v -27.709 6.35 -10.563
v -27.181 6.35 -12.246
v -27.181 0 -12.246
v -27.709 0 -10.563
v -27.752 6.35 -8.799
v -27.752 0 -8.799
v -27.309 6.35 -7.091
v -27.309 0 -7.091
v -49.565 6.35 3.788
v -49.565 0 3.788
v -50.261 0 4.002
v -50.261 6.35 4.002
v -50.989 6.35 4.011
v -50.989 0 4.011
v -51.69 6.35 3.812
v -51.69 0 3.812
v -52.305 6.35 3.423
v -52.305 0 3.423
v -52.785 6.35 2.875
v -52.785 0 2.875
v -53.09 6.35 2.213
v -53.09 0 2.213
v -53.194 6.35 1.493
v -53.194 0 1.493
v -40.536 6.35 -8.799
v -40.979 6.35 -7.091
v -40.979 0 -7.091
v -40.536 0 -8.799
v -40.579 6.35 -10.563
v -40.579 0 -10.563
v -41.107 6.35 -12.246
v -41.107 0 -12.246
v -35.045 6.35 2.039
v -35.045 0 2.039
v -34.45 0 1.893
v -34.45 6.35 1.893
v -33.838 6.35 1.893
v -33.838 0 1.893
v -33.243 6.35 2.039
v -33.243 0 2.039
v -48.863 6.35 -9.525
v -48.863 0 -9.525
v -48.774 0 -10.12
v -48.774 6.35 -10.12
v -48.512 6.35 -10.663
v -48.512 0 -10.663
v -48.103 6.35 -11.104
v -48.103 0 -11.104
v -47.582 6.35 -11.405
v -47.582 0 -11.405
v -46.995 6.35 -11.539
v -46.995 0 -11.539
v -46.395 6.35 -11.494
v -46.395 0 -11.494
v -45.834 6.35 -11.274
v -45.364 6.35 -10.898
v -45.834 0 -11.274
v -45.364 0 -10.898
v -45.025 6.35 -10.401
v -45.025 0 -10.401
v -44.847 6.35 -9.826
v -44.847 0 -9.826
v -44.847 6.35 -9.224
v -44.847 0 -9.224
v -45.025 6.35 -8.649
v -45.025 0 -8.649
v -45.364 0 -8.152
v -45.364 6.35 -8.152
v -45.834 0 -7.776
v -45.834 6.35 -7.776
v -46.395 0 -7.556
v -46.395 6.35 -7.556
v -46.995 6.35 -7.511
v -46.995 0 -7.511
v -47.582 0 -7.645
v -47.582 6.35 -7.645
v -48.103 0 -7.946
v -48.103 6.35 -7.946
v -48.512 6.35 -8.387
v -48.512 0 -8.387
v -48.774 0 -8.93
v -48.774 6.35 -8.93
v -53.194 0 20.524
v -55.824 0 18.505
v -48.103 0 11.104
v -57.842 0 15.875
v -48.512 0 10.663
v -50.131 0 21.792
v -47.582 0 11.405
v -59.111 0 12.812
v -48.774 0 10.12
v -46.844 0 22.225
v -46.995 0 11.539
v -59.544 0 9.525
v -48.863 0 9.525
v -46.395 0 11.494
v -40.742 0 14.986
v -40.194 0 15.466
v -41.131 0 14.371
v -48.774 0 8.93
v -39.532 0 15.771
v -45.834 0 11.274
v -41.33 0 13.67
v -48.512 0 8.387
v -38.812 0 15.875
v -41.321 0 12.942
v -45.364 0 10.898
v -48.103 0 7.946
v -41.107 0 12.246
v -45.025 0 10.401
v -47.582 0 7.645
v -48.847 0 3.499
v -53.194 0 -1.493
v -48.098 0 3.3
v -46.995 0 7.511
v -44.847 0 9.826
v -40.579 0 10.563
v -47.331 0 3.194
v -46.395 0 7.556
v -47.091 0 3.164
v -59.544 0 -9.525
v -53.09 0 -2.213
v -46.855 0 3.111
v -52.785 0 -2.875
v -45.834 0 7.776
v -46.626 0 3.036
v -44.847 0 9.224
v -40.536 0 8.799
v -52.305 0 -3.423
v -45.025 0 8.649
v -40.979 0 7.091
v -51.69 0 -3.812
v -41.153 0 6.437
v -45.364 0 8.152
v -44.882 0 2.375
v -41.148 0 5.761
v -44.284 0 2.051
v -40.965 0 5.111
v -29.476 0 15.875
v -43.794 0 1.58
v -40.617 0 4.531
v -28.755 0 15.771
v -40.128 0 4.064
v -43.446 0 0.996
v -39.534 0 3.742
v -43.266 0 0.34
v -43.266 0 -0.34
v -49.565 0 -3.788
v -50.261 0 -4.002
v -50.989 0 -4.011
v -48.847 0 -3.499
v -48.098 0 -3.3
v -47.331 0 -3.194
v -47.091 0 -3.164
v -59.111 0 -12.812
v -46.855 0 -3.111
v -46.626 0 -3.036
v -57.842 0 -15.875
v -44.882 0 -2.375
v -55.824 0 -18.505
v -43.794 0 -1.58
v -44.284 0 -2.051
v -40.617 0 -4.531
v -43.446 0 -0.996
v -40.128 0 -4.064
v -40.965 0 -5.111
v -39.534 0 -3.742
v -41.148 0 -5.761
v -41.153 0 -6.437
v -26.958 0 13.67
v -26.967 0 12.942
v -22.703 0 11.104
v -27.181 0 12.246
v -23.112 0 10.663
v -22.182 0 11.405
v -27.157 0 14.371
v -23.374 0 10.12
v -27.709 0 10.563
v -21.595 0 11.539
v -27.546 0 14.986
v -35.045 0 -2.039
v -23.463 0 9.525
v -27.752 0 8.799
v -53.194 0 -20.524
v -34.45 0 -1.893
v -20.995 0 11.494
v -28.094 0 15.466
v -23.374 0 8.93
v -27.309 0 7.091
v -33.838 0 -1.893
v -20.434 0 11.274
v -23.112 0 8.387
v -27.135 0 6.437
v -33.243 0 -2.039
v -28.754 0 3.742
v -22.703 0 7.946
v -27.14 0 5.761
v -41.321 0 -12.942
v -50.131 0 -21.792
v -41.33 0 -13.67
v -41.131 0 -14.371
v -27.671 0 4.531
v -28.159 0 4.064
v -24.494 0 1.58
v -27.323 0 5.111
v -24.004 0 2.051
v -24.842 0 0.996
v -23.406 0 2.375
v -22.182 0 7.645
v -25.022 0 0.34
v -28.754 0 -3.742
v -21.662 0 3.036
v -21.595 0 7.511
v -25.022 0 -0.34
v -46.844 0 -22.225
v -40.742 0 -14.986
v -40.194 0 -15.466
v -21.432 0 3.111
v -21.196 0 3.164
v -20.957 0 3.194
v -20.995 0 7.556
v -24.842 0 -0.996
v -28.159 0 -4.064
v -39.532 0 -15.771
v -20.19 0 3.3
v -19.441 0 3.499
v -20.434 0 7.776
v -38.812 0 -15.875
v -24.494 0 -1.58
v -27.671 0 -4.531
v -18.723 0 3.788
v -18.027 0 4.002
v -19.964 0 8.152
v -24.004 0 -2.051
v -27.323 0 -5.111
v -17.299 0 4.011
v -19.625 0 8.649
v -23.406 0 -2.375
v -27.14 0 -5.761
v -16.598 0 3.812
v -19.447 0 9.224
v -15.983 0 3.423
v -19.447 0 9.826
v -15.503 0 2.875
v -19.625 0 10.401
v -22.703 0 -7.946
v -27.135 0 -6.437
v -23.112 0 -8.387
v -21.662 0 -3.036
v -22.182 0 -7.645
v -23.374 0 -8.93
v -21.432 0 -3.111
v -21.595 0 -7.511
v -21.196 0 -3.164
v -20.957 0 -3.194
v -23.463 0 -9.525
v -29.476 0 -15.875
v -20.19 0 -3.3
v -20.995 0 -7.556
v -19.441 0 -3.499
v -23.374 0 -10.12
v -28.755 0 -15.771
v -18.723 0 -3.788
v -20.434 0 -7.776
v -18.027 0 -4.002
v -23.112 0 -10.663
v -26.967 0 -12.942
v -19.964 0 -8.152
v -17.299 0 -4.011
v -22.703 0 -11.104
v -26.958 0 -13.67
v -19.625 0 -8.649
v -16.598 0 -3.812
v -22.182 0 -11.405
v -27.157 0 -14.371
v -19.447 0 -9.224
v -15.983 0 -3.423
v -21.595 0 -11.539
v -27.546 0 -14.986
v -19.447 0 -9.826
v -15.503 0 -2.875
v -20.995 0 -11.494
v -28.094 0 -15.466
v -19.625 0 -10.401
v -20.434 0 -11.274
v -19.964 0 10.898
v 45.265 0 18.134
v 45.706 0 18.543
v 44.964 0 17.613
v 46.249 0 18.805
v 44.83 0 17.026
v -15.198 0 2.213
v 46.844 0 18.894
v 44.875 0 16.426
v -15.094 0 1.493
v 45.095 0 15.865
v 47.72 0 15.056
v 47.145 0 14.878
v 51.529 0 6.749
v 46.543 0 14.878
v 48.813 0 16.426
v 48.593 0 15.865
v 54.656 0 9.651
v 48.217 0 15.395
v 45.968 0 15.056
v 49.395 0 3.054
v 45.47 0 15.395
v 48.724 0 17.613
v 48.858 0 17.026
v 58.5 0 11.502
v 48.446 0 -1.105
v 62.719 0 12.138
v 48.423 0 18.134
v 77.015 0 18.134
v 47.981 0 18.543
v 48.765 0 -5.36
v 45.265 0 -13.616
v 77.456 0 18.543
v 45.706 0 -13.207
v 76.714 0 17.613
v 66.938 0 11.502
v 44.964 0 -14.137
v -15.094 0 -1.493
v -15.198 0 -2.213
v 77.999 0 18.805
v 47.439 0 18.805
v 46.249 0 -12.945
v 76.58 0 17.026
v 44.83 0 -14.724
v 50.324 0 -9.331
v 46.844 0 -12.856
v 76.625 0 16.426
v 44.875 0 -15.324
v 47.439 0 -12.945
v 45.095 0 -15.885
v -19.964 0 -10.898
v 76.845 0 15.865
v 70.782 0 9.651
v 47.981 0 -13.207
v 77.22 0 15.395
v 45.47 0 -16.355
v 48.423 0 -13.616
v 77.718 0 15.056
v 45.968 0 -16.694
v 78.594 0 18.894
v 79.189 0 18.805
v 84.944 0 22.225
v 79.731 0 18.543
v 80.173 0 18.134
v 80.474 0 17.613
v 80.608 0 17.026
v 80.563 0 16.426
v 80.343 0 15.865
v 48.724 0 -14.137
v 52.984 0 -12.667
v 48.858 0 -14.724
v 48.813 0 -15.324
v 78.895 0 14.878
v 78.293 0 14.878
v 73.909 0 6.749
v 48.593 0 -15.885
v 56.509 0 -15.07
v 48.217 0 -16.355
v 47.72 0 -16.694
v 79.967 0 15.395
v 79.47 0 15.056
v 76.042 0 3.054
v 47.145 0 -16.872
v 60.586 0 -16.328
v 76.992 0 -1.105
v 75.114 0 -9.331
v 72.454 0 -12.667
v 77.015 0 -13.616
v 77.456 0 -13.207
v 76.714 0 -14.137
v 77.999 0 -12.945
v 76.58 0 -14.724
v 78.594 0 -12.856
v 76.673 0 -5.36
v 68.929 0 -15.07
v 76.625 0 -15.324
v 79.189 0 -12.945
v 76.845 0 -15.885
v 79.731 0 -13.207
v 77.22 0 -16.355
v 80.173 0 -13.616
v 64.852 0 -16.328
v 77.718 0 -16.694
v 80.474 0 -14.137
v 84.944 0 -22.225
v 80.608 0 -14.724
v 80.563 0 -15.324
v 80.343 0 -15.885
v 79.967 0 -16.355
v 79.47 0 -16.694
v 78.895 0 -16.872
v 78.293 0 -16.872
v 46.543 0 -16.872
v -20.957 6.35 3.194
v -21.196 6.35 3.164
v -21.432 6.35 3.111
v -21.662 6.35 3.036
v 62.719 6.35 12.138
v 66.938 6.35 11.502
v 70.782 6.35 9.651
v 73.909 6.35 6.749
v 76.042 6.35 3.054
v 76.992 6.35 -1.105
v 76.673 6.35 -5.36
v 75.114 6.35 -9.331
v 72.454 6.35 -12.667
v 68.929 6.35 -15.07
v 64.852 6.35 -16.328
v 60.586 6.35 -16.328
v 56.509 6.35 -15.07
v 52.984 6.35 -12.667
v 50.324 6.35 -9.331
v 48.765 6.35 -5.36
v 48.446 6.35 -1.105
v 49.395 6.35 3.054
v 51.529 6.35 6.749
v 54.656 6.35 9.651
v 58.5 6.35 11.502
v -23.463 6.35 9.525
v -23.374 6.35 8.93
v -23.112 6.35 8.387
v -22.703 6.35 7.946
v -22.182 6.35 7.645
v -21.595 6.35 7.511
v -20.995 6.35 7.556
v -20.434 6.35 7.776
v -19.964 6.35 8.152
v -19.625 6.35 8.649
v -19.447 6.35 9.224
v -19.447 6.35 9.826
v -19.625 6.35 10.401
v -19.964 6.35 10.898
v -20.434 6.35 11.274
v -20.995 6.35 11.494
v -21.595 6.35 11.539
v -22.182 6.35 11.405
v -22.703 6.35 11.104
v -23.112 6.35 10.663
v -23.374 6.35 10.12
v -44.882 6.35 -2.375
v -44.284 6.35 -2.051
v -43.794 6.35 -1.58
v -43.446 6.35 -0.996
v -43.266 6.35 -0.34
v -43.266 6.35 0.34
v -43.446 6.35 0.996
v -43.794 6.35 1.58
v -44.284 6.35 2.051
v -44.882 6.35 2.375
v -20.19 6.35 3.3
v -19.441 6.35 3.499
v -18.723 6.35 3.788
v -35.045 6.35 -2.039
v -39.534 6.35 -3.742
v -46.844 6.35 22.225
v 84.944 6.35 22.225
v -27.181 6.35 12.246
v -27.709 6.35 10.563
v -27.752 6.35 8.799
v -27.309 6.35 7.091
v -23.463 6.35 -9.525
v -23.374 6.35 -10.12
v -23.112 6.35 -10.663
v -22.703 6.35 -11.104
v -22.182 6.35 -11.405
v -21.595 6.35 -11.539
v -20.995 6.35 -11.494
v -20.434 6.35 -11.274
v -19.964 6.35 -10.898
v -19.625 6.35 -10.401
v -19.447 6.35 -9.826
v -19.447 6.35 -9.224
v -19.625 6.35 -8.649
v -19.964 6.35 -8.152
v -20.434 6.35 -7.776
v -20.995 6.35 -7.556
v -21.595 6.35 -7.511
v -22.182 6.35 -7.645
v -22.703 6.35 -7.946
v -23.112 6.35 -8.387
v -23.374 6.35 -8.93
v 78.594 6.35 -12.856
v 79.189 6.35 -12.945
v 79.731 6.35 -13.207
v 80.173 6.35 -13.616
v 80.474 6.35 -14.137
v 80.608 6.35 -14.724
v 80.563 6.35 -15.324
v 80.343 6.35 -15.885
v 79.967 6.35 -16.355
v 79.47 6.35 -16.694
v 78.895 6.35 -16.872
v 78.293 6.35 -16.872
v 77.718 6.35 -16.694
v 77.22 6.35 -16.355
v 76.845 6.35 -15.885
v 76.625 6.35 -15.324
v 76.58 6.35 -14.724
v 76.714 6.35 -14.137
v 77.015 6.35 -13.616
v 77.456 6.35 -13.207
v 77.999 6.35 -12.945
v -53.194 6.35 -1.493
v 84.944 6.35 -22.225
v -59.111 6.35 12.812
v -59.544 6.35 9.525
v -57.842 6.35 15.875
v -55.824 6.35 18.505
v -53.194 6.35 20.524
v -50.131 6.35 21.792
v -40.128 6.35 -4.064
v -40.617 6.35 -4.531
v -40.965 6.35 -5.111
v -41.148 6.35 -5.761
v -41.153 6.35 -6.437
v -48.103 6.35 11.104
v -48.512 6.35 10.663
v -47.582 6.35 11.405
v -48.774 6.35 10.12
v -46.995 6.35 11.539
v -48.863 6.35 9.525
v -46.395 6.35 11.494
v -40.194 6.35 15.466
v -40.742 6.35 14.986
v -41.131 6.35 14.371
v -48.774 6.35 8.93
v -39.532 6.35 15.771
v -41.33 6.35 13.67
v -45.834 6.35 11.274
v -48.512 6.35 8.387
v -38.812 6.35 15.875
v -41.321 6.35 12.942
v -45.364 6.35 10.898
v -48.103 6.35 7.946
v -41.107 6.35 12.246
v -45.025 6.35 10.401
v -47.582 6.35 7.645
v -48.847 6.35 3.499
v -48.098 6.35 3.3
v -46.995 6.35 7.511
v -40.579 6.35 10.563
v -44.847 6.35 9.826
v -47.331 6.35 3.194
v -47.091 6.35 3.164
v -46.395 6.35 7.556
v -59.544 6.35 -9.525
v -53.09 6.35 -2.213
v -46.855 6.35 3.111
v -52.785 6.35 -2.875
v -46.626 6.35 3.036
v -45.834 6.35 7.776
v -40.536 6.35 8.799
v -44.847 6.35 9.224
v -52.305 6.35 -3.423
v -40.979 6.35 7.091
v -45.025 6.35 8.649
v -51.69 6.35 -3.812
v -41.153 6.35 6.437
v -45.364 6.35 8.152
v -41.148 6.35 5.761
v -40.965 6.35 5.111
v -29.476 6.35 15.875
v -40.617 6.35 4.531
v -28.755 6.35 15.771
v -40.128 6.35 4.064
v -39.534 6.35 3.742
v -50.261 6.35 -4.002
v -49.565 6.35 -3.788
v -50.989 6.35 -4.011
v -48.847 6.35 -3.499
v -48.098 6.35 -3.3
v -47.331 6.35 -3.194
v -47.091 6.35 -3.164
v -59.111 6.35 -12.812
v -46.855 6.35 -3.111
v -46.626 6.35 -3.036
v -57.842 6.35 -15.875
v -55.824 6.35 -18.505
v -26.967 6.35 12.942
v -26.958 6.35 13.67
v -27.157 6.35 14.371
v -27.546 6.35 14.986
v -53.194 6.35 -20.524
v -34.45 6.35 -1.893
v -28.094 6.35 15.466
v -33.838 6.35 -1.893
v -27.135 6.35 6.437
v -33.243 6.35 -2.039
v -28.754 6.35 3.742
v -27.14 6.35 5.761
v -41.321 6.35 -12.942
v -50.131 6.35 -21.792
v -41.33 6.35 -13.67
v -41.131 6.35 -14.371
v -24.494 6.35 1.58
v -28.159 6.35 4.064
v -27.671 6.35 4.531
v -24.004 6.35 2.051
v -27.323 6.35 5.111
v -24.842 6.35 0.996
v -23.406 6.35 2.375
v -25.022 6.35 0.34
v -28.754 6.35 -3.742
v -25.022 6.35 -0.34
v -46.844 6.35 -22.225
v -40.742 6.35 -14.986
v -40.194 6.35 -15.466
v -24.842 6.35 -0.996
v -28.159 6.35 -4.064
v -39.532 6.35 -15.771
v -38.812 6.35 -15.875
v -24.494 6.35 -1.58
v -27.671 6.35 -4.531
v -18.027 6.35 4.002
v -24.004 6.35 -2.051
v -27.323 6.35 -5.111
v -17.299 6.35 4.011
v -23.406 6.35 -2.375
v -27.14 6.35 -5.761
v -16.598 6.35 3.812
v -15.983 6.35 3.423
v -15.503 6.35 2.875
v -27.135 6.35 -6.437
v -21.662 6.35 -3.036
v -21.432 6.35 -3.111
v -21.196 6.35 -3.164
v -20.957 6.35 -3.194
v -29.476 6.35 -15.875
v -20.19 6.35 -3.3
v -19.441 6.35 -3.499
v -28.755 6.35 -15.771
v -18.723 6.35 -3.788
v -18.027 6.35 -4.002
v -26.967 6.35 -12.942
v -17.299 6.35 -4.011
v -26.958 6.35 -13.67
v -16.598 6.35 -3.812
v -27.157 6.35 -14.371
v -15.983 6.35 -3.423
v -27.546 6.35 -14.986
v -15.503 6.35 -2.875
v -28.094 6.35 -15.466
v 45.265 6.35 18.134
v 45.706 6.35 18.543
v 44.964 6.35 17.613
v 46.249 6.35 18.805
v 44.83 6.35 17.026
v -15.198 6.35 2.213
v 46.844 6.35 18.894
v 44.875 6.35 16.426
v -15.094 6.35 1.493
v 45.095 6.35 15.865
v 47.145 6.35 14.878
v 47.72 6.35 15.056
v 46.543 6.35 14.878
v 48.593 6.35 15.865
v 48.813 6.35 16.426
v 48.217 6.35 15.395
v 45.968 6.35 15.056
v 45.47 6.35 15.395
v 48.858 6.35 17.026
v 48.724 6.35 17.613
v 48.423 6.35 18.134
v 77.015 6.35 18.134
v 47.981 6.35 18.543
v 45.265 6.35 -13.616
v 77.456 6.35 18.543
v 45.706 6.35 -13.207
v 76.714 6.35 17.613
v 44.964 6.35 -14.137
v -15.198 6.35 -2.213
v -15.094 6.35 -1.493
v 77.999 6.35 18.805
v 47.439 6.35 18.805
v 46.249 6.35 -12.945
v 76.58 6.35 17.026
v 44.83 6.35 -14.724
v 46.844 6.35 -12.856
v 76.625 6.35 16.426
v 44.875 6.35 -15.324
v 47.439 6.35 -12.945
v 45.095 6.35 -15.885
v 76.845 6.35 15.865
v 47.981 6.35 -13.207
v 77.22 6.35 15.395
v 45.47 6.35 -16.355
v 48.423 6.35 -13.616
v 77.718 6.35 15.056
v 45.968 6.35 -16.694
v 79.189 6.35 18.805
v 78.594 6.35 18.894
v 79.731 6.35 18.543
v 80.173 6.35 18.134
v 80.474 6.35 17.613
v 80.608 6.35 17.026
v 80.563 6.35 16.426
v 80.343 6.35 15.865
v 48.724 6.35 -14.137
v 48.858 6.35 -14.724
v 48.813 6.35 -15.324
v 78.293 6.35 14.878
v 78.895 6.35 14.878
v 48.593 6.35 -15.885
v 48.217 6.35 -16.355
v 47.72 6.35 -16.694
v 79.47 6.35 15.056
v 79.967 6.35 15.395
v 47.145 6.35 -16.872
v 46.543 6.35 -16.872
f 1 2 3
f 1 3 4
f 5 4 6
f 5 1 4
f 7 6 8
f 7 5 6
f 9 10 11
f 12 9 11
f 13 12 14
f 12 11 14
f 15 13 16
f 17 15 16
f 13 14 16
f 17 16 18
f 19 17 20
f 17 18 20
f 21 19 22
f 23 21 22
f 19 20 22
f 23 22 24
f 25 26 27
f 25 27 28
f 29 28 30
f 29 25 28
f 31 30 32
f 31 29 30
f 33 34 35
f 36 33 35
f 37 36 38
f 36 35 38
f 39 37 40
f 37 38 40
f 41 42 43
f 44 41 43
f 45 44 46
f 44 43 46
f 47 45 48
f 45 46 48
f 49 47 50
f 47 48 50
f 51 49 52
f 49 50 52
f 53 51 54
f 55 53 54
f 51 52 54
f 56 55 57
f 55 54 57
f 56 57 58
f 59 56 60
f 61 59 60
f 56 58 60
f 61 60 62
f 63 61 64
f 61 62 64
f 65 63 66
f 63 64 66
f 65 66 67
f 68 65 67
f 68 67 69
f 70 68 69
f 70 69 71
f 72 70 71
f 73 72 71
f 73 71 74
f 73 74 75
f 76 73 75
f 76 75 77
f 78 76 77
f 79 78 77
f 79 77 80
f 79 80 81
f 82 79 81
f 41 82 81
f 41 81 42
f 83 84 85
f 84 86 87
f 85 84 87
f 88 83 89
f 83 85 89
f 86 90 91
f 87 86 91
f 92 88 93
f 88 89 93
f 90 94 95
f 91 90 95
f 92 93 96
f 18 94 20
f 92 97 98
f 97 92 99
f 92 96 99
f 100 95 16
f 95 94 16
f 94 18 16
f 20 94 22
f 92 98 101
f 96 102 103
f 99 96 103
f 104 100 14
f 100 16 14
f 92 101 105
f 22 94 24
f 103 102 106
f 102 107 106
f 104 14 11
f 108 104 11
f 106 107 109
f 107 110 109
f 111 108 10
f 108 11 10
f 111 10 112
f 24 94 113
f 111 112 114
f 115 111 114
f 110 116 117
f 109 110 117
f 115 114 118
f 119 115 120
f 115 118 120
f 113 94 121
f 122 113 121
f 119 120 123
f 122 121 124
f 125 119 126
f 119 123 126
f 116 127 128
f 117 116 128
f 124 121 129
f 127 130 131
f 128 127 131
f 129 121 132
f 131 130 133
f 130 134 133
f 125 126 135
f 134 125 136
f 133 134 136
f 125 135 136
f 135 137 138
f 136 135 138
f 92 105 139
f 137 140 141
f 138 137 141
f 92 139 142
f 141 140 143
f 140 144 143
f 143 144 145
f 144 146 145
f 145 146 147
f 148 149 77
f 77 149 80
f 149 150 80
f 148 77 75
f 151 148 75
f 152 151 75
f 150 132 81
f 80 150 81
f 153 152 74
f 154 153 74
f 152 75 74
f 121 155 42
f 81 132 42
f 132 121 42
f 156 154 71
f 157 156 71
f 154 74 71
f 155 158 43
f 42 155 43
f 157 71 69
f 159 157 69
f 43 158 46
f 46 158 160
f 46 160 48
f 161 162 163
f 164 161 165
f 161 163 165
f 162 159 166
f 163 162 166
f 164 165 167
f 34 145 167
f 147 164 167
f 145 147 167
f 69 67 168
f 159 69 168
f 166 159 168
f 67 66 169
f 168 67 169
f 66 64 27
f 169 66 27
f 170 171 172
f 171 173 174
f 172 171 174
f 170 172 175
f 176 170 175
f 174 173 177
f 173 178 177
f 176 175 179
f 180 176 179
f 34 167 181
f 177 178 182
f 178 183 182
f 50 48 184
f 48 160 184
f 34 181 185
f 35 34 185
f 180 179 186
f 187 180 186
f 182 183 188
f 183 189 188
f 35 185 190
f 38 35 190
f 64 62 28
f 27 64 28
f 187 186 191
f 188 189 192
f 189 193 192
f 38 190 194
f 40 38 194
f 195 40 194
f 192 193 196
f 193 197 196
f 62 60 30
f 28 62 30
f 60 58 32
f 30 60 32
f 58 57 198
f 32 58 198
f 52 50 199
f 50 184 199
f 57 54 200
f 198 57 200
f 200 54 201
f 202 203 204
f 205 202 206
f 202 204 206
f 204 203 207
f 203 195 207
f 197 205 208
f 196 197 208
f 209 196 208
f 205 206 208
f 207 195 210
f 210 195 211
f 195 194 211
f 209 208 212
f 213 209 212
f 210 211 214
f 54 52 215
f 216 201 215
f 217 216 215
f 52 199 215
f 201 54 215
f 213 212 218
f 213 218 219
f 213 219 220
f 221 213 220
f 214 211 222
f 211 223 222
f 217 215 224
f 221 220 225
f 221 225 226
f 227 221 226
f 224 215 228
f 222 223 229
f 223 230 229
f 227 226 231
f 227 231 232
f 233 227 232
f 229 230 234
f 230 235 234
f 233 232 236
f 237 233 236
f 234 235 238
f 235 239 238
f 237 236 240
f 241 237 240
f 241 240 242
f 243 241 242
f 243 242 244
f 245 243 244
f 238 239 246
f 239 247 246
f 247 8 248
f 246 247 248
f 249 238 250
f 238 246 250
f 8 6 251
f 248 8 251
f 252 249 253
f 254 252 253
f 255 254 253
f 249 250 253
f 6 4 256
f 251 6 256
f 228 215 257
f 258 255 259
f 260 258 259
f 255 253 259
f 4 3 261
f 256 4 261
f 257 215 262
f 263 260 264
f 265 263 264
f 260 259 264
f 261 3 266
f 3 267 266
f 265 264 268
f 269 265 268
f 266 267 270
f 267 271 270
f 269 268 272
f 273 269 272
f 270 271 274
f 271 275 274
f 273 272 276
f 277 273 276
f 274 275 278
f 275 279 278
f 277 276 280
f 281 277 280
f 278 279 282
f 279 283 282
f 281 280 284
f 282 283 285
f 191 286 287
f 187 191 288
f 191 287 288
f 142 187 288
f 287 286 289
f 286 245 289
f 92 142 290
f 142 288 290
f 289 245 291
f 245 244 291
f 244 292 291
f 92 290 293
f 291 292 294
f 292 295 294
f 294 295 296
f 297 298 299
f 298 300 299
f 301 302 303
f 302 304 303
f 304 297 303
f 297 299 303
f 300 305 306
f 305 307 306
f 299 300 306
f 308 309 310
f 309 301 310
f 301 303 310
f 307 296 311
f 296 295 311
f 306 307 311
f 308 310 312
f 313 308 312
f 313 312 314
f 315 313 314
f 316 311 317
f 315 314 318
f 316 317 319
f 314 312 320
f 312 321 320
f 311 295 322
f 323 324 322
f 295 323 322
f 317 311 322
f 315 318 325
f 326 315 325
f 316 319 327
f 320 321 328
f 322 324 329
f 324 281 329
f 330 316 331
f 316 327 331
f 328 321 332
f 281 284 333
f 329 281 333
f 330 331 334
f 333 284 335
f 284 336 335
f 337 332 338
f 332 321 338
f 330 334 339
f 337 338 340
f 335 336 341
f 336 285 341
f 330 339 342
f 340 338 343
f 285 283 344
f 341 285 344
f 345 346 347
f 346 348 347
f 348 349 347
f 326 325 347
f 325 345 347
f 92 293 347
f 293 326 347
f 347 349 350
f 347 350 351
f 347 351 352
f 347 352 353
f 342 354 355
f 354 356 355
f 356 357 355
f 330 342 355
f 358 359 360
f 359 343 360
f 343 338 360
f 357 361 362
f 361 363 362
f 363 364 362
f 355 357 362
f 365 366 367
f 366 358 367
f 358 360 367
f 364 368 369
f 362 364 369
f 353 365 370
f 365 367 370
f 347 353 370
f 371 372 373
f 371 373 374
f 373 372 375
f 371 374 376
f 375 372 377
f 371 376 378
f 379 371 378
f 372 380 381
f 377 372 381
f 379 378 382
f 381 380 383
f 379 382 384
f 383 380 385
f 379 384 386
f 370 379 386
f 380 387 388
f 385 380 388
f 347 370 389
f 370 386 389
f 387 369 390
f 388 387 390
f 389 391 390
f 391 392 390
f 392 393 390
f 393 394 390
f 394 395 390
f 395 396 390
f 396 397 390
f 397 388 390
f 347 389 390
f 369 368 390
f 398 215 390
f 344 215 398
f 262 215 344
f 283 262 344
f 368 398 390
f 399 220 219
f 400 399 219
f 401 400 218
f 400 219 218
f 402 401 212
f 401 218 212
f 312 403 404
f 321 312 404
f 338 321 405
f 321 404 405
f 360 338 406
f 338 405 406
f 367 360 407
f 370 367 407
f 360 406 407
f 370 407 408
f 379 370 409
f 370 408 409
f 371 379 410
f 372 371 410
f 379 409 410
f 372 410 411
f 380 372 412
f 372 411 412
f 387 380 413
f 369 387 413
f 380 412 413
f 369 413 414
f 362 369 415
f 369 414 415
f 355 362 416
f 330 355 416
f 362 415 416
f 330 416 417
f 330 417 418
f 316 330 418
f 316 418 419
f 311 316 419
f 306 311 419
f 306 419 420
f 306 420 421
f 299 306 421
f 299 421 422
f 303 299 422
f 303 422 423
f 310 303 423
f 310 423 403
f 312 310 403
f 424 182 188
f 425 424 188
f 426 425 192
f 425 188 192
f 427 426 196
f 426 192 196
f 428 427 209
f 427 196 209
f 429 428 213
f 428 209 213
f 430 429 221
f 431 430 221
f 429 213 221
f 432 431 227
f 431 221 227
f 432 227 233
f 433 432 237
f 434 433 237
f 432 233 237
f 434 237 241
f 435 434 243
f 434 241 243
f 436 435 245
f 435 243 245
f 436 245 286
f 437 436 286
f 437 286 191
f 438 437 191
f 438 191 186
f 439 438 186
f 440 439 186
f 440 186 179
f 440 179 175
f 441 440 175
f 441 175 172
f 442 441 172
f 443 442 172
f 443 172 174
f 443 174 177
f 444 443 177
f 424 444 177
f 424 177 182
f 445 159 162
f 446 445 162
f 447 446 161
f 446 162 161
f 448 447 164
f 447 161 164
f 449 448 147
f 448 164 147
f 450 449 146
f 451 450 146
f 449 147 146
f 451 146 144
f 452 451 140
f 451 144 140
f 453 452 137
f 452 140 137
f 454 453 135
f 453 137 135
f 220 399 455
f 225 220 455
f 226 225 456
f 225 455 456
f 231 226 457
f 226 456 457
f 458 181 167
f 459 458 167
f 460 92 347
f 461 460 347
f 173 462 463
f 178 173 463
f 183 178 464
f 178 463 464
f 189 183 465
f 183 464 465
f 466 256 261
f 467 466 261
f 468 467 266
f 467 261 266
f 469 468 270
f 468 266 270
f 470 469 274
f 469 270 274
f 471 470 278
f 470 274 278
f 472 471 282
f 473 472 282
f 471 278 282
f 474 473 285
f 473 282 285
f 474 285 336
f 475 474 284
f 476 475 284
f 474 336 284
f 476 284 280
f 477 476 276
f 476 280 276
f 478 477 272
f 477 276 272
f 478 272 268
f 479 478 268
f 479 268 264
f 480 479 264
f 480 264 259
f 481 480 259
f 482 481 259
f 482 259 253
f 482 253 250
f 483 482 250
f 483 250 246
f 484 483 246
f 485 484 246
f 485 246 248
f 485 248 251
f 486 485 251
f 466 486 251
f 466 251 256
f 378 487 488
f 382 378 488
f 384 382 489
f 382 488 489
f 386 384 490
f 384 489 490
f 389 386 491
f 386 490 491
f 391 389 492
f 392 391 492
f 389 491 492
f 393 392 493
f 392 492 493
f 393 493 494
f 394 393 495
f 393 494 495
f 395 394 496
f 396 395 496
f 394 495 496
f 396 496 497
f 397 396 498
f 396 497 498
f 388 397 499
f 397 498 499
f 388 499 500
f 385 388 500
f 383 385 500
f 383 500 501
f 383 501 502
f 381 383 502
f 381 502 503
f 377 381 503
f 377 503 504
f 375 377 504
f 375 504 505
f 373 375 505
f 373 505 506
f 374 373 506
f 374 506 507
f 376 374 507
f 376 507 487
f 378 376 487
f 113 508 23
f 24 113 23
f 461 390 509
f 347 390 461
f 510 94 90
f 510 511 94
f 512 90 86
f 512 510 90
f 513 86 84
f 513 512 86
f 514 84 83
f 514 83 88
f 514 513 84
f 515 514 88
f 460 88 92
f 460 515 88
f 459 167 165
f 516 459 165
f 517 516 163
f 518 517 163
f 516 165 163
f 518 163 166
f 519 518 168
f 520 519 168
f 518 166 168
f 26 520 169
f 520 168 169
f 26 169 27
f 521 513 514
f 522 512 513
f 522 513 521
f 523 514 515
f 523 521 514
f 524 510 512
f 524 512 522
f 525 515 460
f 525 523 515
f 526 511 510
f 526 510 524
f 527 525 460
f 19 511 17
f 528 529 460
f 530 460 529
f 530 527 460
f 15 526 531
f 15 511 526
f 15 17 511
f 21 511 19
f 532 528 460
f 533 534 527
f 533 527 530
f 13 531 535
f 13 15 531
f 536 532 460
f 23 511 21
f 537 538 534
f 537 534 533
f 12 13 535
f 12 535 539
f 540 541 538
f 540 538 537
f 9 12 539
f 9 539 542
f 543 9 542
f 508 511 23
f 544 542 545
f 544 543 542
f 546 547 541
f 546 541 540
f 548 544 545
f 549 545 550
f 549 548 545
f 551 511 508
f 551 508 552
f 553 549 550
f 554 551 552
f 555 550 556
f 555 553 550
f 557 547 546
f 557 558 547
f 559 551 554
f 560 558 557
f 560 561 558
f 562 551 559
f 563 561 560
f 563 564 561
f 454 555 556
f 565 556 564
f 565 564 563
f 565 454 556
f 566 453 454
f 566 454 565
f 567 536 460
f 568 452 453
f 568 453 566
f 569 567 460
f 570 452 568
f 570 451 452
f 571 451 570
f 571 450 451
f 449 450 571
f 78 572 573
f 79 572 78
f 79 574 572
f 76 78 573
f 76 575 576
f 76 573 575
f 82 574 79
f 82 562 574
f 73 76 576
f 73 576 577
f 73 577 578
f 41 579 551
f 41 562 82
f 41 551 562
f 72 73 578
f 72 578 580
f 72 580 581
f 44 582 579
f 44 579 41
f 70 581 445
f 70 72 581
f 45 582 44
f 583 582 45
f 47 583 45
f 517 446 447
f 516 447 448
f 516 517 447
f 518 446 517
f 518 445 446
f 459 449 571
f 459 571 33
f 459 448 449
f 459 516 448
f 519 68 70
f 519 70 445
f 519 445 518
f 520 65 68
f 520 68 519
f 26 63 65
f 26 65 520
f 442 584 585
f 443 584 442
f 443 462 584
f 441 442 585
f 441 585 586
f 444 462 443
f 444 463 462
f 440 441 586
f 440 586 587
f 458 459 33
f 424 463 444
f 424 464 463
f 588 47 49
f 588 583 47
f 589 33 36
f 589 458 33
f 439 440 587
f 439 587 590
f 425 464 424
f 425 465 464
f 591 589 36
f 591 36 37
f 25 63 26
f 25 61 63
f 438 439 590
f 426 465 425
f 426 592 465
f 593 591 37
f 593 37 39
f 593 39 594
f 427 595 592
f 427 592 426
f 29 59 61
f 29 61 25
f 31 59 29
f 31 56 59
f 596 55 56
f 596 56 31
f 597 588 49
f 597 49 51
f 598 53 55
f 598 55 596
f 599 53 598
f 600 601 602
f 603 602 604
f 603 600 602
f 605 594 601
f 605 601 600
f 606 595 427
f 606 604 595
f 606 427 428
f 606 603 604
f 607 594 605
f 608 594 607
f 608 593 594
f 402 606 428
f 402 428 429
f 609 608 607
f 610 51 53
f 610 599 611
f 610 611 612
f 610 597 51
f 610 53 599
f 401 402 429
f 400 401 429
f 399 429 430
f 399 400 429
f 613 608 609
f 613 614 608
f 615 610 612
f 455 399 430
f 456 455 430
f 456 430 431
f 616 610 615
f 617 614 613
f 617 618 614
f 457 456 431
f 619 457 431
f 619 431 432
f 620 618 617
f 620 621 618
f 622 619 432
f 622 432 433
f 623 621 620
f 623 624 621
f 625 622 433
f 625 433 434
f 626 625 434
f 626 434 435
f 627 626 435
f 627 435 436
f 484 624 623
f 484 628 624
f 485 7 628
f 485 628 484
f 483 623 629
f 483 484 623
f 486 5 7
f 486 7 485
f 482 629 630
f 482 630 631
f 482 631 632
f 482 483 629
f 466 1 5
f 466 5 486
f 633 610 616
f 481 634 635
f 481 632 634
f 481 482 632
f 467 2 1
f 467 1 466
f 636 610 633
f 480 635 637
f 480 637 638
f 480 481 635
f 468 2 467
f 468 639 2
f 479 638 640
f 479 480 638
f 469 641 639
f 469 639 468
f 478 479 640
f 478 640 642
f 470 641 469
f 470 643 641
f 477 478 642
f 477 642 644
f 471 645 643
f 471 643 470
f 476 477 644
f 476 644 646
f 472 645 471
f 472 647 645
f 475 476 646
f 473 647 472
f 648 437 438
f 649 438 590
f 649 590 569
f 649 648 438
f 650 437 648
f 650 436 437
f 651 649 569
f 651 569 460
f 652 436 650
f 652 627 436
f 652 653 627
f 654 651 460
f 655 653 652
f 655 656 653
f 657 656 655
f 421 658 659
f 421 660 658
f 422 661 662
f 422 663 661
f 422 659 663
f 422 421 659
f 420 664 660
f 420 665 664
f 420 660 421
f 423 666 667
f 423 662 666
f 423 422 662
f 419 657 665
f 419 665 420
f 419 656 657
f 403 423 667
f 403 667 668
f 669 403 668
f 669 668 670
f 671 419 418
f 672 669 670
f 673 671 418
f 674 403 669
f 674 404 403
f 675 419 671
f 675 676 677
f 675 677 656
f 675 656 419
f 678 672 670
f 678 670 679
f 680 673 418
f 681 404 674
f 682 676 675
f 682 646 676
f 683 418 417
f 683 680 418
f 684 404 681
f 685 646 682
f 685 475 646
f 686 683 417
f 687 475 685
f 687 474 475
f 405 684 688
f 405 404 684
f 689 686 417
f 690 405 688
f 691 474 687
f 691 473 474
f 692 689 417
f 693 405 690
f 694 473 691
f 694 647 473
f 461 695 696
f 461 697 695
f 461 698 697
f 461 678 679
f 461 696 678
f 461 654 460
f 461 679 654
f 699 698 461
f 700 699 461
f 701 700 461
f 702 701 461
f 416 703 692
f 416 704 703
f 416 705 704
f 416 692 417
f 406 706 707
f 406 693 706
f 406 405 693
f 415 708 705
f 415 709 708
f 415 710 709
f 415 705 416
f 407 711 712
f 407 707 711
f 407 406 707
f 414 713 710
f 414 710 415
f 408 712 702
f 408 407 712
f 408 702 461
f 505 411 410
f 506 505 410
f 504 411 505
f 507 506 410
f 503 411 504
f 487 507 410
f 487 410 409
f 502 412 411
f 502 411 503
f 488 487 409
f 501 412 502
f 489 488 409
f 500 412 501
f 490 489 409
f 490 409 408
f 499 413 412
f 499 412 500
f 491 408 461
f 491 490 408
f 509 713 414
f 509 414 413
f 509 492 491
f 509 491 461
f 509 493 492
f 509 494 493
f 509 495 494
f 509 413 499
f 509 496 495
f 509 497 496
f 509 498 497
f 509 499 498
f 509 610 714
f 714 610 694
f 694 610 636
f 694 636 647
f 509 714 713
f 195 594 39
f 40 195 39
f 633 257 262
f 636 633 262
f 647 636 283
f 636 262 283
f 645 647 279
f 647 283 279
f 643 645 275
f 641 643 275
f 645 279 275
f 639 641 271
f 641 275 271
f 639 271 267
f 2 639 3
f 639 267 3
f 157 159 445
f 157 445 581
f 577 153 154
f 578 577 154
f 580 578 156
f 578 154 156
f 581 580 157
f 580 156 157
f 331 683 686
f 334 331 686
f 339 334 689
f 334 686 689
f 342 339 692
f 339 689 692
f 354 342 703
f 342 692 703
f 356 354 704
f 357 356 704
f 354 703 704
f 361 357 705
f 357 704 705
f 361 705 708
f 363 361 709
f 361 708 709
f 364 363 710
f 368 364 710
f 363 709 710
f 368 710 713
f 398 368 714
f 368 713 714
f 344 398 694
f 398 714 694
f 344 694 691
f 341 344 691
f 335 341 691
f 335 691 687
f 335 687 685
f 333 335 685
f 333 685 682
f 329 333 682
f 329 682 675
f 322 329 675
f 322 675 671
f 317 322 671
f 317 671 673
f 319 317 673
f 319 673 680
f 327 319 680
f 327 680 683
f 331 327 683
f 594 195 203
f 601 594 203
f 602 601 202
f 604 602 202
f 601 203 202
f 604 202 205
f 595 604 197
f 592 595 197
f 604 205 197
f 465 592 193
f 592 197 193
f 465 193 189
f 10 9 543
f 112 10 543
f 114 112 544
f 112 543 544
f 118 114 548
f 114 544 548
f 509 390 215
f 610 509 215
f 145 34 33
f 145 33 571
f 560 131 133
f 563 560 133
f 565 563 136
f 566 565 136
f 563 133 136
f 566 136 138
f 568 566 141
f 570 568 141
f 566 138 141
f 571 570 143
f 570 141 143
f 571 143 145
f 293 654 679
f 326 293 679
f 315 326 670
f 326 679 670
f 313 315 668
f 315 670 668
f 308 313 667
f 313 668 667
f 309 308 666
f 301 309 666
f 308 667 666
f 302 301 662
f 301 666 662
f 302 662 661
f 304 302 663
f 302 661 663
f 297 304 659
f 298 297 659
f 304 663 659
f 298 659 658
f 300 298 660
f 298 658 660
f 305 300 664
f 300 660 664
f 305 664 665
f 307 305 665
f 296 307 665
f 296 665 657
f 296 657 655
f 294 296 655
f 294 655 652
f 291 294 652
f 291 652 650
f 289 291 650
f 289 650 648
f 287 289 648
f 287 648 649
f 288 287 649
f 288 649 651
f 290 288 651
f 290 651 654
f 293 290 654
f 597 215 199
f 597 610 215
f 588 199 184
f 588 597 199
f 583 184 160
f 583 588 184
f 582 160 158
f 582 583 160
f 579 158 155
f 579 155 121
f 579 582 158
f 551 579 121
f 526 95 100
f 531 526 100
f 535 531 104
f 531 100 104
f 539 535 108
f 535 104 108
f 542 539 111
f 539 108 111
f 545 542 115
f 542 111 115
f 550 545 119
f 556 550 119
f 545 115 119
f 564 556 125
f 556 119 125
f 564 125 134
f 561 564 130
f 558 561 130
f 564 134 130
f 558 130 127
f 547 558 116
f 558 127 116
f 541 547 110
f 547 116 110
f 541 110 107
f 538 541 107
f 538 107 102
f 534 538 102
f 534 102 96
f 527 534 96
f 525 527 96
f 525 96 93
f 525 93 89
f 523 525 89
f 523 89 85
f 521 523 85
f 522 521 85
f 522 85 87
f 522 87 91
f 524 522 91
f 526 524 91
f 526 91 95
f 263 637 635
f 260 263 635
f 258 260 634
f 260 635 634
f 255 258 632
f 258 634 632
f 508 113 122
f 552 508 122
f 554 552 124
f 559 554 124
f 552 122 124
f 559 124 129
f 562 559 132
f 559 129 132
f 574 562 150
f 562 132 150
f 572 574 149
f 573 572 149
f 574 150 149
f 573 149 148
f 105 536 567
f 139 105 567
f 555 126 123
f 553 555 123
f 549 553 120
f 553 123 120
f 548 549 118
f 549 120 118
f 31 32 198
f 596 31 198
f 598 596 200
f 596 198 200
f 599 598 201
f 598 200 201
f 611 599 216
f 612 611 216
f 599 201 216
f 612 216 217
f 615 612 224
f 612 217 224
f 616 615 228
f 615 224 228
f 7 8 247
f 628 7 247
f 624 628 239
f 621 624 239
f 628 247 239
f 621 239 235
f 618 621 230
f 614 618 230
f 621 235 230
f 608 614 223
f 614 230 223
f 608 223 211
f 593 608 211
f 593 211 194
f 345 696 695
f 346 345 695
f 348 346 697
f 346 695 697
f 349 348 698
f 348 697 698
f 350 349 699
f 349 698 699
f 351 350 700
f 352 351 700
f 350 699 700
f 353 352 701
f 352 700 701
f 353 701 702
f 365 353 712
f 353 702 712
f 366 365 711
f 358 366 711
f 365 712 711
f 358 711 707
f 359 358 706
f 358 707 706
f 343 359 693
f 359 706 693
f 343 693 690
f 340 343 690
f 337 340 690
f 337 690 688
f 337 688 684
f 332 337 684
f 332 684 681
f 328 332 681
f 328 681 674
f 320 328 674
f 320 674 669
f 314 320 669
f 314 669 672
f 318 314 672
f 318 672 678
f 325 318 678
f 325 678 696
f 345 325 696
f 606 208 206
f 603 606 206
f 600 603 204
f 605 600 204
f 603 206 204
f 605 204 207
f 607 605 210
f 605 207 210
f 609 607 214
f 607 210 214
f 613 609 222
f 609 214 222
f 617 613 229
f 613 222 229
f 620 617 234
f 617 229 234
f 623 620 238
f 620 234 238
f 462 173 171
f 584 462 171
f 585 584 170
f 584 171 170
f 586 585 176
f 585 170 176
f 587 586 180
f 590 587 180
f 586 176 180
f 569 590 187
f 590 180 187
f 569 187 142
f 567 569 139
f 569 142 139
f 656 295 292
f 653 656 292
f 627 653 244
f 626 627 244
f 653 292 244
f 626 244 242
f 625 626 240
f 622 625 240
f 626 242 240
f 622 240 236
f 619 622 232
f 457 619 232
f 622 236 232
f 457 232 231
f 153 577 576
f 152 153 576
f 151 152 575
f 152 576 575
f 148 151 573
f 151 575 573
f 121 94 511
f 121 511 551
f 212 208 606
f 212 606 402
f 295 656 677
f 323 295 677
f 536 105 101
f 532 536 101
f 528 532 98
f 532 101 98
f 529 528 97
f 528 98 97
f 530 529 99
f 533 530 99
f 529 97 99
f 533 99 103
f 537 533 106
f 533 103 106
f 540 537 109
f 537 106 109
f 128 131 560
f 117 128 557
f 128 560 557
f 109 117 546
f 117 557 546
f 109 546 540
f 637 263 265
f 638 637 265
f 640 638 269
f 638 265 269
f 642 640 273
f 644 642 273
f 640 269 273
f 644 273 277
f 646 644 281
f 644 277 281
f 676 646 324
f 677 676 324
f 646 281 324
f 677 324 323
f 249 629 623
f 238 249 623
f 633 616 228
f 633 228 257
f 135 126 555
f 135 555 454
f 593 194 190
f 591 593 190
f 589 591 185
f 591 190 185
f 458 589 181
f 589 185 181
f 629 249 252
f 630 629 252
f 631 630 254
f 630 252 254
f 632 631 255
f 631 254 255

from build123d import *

# Parameters (mm, degrees)
BOSS_EXTRUDE1_DEPTH    = 6.35
F_10_32_TAPPED_HOLE2_D = 4.0386
FILLET2_R              = 12.7
CUT_EXTRUDE3_DEPTH     = 89.032651707
FILLET3_DEPTH          = 6.35
SKETCH12_R             = 14.3129
CUT_EXTRUDE4_DEPTH     = 89.032651707
SKETCH13_R             = 2.0193
CUT_EXTRUDE5_DEPTH     = 89.032651707


with BuildPart() as part:
    # Sketch1 → Boss-Extrude1 (new body)
    with BuildSketch(Plane(origin=(0, 0, 0), x_dir=(1, 0, 0), z_dir=(0, 1, 0))):
        Polygon((59.54395, 22.225), (84.94395, 22.225), (84.94395, -22.225), (59.54395, -22.225), (-59.54395, -22.225), (-59.54395, 22.225), align=None)
    extrude(amount=BOSS_EXTRUDE1_DEPTH)

    # #10-32 Tapped Hole2 (through all)
    with Locations(Plane(origin=(0, 6.35, 0), x_dir=(1, 0, 0), z_dir=(0, 1, 0))):
        with Locations((-46.84395, 9.525), (-21.44395, 9.525), (-21.44395, -9.525), (-46.84395, -9.525)):
            Hole(F_10_32_TAPPED_HOLE2_D / 2)

    # Fillet2
    fillet2_edges = [part.edges().sort_by_distance(p)[0] for p in [
        (-59.54395, 3.175, 22.225),
        (-59.54395, 3.175, -22.225),
    ]]
    fillet(fillet2_edges, radius=FILLET2_R)

    # Sketch11 → Cut-Extrude3 (cut, through all)
    with BuildSketch(Plane(origin=(0, 6.35, 0), x_dir=(1, 0, 0), z_dir=(0, 1, 0))):
        with BuildLine():
            Line((-46.84395, 15.875), (-21.44395, 15.875))
            ThreePointArc((-21.44395, 15.875), (-27.353773893, 11.848032834), (-25.767954708, 4.874679228))
            Line((-25.767954708, 4.874679228), (-34.14395, 1.697847323))
            Line((-34.14395, 1.697847323), (-42.519945292, 4.874679228))
            ThreePointArc((-42.519945292, 4.874679228), (-40.934126107, 11.848032834), (-46.84395, 15.875))
        make_face()
        with BuildLine():
            Line((-15.09395, -9.525), (-15.09395, 9.525))
            ThreePointArc((-15.09395, 9.525), (-16.90021853, 5.089123048), (-21.291431679, 3.176831905))
            Line((-21.291431679, 3.176831905), (-29.667426971, 0))
            Line((-29.667426971, 0), (-21.291431679, -3.176831905))
            ThreePointArc((-21.291431679, -3.176831905), (-16.90021853, -5.089123048), (-15.09395, -9.525))
        make_face()
        with BuildLine():
            Line((-53.19395, 9.525), (-53.19395, -9.525))
            ThreePointArc((-53.19395, -9.525), (-51.38768147, -5.089123048), (-46.996468321, -3.176831905))
            Line((-46.996468321, -3.176831905), (-38.620473029, 0))
            Line((-38.620473029, 0), (-46.996468321, 3.176831905))
            ThreePointArc((-46.996468321, 3.176831905), (-51.38768147, 5.089123048), (-53.19395, 9.525))
        make_face()
        with BuildLine():
            Line((-46.84395, -15.875), (-21.44395, -15.875))
            ThreePointArc((-21.44395, -15.875), (-27.353773893, -11.848032834), (-25.767954708, -4.874679228))
            Line((-25.767954708, -4.874679228), (-34.14395, -1.697847323))
            Line((-34.14395, -1.697847323), (-42.519945292, -4.874679228))
            ThreePointArc((-42.519945292, -4.874679228), (-40.934126107, -11.848032834), (-46.84395, -15.875))
        make_face()
    extrude(amount=-CUT_EXTRUDE3_DEPTH, mode=Mode.SUBTRACT)

    # Fillet3: read off the stored shape, not the designer's step
    # Fillet3 outline → Fillet3 (add)
    with BuildSketch(Plane(origin=(0, 0, 0), x_dir=(1, 0, 0), z_dir=(0, 1, 0))):
        with BuildLine():
            ThreePointArc((-18.722521429, 3.787724817), (-16.276262891, 3.63950655), (-15.09395, 1.492814743))
            Line((-15.09395, 1.492814743), (-15.09395, 9.525))
            ThreePointArc((-15.09395, 9.525), (-16.077220482, 6.130782227), (-18.722521429, 3.787724817))
        make_face()
        with BuildLine():
            Line((-15.09395, -9.525), (-15.09395, -1.492814743))
            ThreePointArc((-15.09395, -1.492814743), (-16.276262891, -3.63950655), (-18.722521429, -3.787724817))
            ThreePointArc((-18.722521429, -3.787724817), (-16.077220482, -6.130782227), (-15.09395, -9.525))
        make_face()
        with BuildLine():
            ThreePointArc((-21.662369003, 3.036143487), (-21.315105323, 3.140185377), (-20.956567225, 3.19373172))
            ThreePointArc((-20.956567225, 3.19373172), (-21.12388789, 3.183071252), (-21.291431679, 3.176831905))
            Line((-21.291431679, 3.176831905), (-21.662369003, 3.036143487))
        make_face()
        with BuildLine():
            ThreePointArc((-21.291431679, -3.176831905), (-21.12388789, -3.183071252), (-20.956567225, -3.19373172))
            ThreePointArc((-20.956567225, -3.19373172), (-21.315105323, -3.140185377), (-21.662369003, -3.036143487))
            Line((-21.662369003, -3.036143487), (-21.291431679, -3.176831905))
        make_face()
        with BuildLine():
            ThreePointArc((-23.405745013, -2.374919079), (-25.044990125, 0), (-23.405745013, 2.374919079))
            Line((-23.405745013, 2.374919079), (-29.667426971, 0))
            Line((-29.667426971, 0), (-23.405745013, -2.374919079))
        make_face()
        with BuildLine():
            ThreePointArc((-41.106674817, 12.246428571), (-40.95845655, 14.692687109), (-38.811764743, 15.875))
            Line((-38.811764743, 15.875), (-46.84395, 15.875))
            ThreePointArc((-46.84395, 15.875), (-43.449732228, 14.891729517), (-41.106674817, 12.246428571))
        make_face()
        with BuildLine():
            Line((-21.44395, 15.875), (-29.476135257, 15.875))
            ThreePointArc((-29.476135257, 15.875), (-27.32944345, 14.692687109), (-27.181225183, 12.246428571))
            ThreePointArc((-27.181225183, 12.246428571), (-24.838167772, 14.891729517), (-21.44395, 15.875))
        make_face()
        with BuildLine():
            ThreePointArc((-39.533862913, 3.742123461), (-40.965188005, 5.110562055), (-40.979062875, 7.090744671))
            ThreePointArc((-40.979062875, 7.090744671), (-41.630398839, 5.899895272), (-42.519945292, 4.874679228))
            Line((-42.519945292, 4.874679228), (-39.533862913, 3.742123461))
        make_face()
        with BuildLine():
            ThreePointArc((-25.767954708, 4.874679228), (-26.657501161, 5.899895272), (-27.308837125, 7.090744671))
            ThreePointArc((-27.308837125, 7.090744671), (-27.322711995, 5.110562055), (-28.754037087, 3.742123461))
            Line((-28.754037087, 3.742123461), (-25.767954708, 4.874679228))
        make_face()
        with BuildLine():
            ThreePointArc((-33.243195112, 2.03948396), (-34.14395, 1.874403039), (-35.044704888, 2.03948396))
            Line((-35.044704888, 2.03948396), (-34.14395, 1.697847323))
            Line((-34.14395, 1.697847323), (-33.243195112, 2.03948396))
        make_face()
        with BuildLine():
            Line((-38.620473029, 0), (-44.882154987, 2.374919079))
            ThreePointArc((-44.882154987, 2.374919079), (-43.242909875, 0), (-44.882154987, -2.374919079))
            Line((-44.882154987, -2.374919079), (-38.620473029, 0))
        make_face()
        with BuildLine():
            ThreePointArc((-47.331332775, 3.19373172), (-46.972794677, 3.140185377), (-46.625530997, 3.036143487))
            Line((-46.625530997, 3.036143487), (-46.996468321, 3.176831905))
            ThreePointArc((-46.996468321, 3.176831905), (-47.16401211, 3.183071252), (-47.331332775, 3.19373172))
        make_face()
        with BuildLine():
            Line((-46.996468321, -3.176831905), (-46.625530997, -3.036143487))
            ThreePointArc((-46.625530997, -3.036143487), (-46.972794677, -3.140185377), (-47.331332775, -3.19373172))
            ThreePointArc((-47.331332775, -3.19373172), (-47.16401211, -3.183071252), (-46.996468321, -3.176831905))
        make_face()
        with BuildLine():
            ThreePointArc((-53.19395, 1.492814743), (-52.011637109, 3.63950655), (-49.565378571, 3.787724817))
            ThreePointArc((-49.565378571, 3.787724817), (-52.210679518, 6.130782227), (-53.19395, 9.525))
            Line((-53.19395, 9.525), (-53.19395, 1.492814743))
        make_face()
        with BuildLine():
            ThreePointArc((-53.19395, -9.525), (-52.210679518, -6.130782227), (-49.565378571, -3.787724816))
            ThreePointArc((-49.565378571, -3.787724816), (-52.011637109, -3.63950655), (-53.19395, -1.492814743))
            Line((-53.19395, -1.492814743), (-53.19395, -9.525))
        make_face()
        with BuildLine():
            ThreePointArc((-40.979062875, -7.090744671), (-40.965188005, -5.110562055), (-39.533862913, -3.742123461))
            Line((-39.533862913, -3.742123461), (-42.519945292, -4.874679228))
            ThreePointArc((-42.519945292, -4.874679228), (-41.630398839, -5.899895272), (-40.979062875, -7.090744671))
        make_face()
        with BuildLine():
            Line((-34.14395, -1.697847323), (-35.044704888, -2.03948396))
            ThreePointArc((-35.044704888, -2.03948396), (-34.14395, -1.874403039), (-33.243195112, -2.03948396))
            Line((-33.243195112, -2.03948396), (-34.14395, -1.697847323))
        make_face()
        with BuildLine():
            ThreePointArc((-38.811764743, -15.875), (-40.95845655, -14.692687109), (-41.106674817, -12.246428571))
            ThreePointArc((-41.106674817, -12.246428571), (-43.449732228, -14.891729517), (-46.84395, -15.875))
            Line((-46.84395, -15.875), (-38.811764743, -15.875))
        make_face()
        with BuildLine():
            Line((-25.767954708, -4.874679228), (-28.754037087, -3.742123461))
            ThreePointArc((-28.754037087, -3.742123461), (-27.322711995, -5.110562055), (-27.308837125, -7.090744671))
            ThreePointArc((-27.308837125, -7.090744671), (-26.657501161, -5.899895272), (-25.767954708, -4.874679228))
        make_face()
        with BuildLine():
            ThreePointArc((-27.181225183, -12.246428571), (-27.32944345, -14.692687109), (-29.476135257, -15.875))
            Line((-29.476135257, -15.875), (-21.44395, -15.875))
            ThreePointArc((-21.44395, -15.875), (-24.838167772, -14.891729517), (-27.181225183, -12.246428571))
        make_face()
    extrude(amount=FILLET3_DEPTH)

    # Sketch12 → Cut-Extrude4 (cut, through all)
    with BuildSketch(Plane(origin=(0, 6.35, 0), x_dir=(1, 0, 0), z_dir=(0, 1, 0))):
        with Locations(Location((62.71895, 2.175, 0), (0, 0, 270))):
            Circle(SKETCH12_R)
    extrude(amount=-CUT_EXTRUDE4_DEPTH, mode=Mode.SUBTRACT)

    # Sketch13 → Cut-Extrude5 (cut, through all)
    with BuildSketch(Plane(origin=(0, 6.35, 0), x_dir=(1, 0, 0), z_dir=(0, 1, 0))):
        with Locations(Location((78.59395, 14.875, 0), (0, 0, 270))):
            Circle(SKETCH13_R)
        with Locations(Location((46.84395, 14.875, 0), (0, 0, 270))):
            Circle(SKETCH13_R)
        with Locations(Location((46.84395, -16.875, 0), (0, 0, 270))):
            Circle(SKETCH13_R)
        with Locations(Location((78.59395, -16.875, 0), (0, 0, 270))):
            Circle(SKETCH13_R)
    extrude(amount=-CUT_EXTRUDE5_DEPTH, mode=Mode.SUBTRACT)


solid = part.part
